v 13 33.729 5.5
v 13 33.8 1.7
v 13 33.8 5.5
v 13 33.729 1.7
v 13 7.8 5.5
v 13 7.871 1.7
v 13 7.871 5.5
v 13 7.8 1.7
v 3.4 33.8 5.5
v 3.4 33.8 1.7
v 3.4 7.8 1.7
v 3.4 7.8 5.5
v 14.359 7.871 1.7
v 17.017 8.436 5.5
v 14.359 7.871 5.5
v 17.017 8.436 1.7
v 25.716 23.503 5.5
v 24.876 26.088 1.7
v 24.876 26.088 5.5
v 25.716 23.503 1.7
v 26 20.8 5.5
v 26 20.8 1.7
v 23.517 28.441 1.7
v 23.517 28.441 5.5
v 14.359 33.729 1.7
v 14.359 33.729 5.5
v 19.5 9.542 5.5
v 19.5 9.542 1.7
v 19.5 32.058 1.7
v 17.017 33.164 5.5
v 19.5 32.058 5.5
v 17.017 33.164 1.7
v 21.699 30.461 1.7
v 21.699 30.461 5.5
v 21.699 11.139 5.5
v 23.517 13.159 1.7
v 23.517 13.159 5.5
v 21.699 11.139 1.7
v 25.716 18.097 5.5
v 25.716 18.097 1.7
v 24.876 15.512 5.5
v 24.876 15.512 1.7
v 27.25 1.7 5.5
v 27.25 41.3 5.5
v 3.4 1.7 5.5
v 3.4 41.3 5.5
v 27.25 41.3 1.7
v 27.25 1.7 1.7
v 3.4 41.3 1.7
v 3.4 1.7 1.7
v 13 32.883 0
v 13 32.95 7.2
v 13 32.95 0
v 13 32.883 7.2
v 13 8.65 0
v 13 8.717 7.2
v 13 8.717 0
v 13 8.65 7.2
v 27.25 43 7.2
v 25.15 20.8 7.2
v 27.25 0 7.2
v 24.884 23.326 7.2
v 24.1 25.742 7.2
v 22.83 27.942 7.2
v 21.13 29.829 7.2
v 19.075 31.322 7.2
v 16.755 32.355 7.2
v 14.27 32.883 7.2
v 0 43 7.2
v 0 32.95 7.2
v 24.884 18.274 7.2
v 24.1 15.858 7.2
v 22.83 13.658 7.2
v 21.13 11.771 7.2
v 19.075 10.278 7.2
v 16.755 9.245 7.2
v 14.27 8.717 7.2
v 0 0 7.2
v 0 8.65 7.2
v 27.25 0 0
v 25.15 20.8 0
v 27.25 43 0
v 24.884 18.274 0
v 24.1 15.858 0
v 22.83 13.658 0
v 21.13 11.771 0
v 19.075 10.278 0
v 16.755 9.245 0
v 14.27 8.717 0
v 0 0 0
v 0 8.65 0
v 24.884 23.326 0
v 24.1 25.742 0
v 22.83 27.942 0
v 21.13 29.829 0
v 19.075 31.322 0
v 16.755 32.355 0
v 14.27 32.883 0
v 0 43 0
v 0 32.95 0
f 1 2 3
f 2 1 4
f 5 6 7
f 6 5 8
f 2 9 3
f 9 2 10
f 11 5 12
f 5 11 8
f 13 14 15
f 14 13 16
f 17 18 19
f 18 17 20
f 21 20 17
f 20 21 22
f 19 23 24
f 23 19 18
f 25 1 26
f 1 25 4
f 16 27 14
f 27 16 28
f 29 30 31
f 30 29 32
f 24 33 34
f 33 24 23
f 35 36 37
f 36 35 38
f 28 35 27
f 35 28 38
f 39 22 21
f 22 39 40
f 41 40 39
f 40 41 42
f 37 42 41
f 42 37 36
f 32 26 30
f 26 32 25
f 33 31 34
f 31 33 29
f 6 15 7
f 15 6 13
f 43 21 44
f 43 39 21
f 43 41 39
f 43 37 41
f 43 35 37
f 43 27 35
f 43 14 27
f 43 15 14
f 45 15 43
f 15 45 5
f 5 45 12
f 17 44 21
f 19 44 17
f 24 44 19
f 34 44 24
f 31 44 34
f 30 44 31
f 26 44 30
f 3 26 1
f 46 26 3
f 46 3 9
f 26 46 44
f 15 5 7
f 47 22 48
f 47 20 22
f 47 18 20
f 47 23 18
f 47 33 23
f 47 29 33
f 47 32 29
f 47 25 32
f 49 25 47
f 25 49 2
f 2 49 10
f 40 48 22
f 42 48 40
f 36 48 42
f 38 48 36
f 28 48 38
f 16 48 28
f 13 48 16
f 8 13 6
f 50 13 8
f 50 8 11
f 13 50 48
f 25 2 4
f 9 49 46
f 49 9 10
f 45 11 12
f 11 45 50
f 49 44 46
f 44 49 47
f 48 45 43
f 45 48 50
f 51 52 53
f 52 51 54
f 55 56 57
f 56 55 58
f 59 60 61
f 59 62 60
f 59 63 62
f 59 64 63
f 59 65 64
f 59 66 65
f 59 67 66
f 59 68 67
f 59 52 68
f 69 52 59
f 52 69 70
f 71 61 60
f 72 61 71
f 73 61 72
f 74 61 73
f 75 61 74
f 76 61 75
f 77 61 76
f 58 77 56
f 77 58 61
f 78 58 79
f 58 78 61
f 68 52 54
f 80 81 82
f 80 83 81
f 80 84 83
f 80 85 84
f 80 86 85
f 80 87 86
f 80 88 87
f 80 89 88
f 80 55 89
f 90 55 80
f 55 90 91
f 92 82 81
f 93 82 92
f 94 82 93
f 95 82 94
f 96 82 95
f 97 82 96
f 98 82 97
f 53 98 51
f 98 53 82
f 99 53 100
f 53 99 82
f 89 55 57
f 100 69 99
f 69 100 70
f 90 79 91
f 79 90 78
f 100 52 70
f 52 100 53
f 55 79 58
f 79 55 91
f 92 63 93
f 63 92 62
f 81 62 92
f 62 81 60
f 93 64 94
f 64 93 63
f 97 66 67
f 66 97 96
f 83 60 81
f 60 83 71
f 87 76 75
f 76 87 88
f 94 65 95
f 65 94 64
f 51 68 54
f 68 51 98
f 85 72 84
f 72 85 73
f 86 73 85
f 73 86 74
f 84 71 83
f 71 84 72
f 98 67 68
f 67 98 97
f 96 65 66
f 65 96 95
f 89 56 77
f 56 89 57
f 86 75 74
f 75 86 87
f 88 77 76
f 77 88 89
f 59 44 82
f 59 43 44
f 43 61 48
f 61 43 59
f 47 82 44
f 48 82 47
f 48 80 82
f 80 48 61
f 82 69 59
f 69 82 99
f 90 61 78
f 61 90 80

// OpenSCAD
innerOffset = 7.8;
radius = 13;
depth = 7.2;
wallThickness = 1.7;
width = 27.25;
length = 43;

module cutoutpiece(adjust)
{
    union(){
        translate([0,innerOffset,0]) cube([radius, (radius*2)-adjust,depth]); //inner rectangle
        translate([radius,radius + innerOffset-(adjust/2),0]) cylinder(depth,r=(radius - (adjust/2)));
    }
 }
 
difference(){
    cube([width, length, depth]); //outer cube
    difference(){
        translate([wallThickness * 2, wallThickness, wallThickness]) cube([width - wallThickness, length - (wallThickness *2), depth - (wallThickness * 2)]); // innercube
        cutoutpiece(0);
    }
    translate([0,wallThickness/2,0]) cutoutpiece(wallThickness);
}
